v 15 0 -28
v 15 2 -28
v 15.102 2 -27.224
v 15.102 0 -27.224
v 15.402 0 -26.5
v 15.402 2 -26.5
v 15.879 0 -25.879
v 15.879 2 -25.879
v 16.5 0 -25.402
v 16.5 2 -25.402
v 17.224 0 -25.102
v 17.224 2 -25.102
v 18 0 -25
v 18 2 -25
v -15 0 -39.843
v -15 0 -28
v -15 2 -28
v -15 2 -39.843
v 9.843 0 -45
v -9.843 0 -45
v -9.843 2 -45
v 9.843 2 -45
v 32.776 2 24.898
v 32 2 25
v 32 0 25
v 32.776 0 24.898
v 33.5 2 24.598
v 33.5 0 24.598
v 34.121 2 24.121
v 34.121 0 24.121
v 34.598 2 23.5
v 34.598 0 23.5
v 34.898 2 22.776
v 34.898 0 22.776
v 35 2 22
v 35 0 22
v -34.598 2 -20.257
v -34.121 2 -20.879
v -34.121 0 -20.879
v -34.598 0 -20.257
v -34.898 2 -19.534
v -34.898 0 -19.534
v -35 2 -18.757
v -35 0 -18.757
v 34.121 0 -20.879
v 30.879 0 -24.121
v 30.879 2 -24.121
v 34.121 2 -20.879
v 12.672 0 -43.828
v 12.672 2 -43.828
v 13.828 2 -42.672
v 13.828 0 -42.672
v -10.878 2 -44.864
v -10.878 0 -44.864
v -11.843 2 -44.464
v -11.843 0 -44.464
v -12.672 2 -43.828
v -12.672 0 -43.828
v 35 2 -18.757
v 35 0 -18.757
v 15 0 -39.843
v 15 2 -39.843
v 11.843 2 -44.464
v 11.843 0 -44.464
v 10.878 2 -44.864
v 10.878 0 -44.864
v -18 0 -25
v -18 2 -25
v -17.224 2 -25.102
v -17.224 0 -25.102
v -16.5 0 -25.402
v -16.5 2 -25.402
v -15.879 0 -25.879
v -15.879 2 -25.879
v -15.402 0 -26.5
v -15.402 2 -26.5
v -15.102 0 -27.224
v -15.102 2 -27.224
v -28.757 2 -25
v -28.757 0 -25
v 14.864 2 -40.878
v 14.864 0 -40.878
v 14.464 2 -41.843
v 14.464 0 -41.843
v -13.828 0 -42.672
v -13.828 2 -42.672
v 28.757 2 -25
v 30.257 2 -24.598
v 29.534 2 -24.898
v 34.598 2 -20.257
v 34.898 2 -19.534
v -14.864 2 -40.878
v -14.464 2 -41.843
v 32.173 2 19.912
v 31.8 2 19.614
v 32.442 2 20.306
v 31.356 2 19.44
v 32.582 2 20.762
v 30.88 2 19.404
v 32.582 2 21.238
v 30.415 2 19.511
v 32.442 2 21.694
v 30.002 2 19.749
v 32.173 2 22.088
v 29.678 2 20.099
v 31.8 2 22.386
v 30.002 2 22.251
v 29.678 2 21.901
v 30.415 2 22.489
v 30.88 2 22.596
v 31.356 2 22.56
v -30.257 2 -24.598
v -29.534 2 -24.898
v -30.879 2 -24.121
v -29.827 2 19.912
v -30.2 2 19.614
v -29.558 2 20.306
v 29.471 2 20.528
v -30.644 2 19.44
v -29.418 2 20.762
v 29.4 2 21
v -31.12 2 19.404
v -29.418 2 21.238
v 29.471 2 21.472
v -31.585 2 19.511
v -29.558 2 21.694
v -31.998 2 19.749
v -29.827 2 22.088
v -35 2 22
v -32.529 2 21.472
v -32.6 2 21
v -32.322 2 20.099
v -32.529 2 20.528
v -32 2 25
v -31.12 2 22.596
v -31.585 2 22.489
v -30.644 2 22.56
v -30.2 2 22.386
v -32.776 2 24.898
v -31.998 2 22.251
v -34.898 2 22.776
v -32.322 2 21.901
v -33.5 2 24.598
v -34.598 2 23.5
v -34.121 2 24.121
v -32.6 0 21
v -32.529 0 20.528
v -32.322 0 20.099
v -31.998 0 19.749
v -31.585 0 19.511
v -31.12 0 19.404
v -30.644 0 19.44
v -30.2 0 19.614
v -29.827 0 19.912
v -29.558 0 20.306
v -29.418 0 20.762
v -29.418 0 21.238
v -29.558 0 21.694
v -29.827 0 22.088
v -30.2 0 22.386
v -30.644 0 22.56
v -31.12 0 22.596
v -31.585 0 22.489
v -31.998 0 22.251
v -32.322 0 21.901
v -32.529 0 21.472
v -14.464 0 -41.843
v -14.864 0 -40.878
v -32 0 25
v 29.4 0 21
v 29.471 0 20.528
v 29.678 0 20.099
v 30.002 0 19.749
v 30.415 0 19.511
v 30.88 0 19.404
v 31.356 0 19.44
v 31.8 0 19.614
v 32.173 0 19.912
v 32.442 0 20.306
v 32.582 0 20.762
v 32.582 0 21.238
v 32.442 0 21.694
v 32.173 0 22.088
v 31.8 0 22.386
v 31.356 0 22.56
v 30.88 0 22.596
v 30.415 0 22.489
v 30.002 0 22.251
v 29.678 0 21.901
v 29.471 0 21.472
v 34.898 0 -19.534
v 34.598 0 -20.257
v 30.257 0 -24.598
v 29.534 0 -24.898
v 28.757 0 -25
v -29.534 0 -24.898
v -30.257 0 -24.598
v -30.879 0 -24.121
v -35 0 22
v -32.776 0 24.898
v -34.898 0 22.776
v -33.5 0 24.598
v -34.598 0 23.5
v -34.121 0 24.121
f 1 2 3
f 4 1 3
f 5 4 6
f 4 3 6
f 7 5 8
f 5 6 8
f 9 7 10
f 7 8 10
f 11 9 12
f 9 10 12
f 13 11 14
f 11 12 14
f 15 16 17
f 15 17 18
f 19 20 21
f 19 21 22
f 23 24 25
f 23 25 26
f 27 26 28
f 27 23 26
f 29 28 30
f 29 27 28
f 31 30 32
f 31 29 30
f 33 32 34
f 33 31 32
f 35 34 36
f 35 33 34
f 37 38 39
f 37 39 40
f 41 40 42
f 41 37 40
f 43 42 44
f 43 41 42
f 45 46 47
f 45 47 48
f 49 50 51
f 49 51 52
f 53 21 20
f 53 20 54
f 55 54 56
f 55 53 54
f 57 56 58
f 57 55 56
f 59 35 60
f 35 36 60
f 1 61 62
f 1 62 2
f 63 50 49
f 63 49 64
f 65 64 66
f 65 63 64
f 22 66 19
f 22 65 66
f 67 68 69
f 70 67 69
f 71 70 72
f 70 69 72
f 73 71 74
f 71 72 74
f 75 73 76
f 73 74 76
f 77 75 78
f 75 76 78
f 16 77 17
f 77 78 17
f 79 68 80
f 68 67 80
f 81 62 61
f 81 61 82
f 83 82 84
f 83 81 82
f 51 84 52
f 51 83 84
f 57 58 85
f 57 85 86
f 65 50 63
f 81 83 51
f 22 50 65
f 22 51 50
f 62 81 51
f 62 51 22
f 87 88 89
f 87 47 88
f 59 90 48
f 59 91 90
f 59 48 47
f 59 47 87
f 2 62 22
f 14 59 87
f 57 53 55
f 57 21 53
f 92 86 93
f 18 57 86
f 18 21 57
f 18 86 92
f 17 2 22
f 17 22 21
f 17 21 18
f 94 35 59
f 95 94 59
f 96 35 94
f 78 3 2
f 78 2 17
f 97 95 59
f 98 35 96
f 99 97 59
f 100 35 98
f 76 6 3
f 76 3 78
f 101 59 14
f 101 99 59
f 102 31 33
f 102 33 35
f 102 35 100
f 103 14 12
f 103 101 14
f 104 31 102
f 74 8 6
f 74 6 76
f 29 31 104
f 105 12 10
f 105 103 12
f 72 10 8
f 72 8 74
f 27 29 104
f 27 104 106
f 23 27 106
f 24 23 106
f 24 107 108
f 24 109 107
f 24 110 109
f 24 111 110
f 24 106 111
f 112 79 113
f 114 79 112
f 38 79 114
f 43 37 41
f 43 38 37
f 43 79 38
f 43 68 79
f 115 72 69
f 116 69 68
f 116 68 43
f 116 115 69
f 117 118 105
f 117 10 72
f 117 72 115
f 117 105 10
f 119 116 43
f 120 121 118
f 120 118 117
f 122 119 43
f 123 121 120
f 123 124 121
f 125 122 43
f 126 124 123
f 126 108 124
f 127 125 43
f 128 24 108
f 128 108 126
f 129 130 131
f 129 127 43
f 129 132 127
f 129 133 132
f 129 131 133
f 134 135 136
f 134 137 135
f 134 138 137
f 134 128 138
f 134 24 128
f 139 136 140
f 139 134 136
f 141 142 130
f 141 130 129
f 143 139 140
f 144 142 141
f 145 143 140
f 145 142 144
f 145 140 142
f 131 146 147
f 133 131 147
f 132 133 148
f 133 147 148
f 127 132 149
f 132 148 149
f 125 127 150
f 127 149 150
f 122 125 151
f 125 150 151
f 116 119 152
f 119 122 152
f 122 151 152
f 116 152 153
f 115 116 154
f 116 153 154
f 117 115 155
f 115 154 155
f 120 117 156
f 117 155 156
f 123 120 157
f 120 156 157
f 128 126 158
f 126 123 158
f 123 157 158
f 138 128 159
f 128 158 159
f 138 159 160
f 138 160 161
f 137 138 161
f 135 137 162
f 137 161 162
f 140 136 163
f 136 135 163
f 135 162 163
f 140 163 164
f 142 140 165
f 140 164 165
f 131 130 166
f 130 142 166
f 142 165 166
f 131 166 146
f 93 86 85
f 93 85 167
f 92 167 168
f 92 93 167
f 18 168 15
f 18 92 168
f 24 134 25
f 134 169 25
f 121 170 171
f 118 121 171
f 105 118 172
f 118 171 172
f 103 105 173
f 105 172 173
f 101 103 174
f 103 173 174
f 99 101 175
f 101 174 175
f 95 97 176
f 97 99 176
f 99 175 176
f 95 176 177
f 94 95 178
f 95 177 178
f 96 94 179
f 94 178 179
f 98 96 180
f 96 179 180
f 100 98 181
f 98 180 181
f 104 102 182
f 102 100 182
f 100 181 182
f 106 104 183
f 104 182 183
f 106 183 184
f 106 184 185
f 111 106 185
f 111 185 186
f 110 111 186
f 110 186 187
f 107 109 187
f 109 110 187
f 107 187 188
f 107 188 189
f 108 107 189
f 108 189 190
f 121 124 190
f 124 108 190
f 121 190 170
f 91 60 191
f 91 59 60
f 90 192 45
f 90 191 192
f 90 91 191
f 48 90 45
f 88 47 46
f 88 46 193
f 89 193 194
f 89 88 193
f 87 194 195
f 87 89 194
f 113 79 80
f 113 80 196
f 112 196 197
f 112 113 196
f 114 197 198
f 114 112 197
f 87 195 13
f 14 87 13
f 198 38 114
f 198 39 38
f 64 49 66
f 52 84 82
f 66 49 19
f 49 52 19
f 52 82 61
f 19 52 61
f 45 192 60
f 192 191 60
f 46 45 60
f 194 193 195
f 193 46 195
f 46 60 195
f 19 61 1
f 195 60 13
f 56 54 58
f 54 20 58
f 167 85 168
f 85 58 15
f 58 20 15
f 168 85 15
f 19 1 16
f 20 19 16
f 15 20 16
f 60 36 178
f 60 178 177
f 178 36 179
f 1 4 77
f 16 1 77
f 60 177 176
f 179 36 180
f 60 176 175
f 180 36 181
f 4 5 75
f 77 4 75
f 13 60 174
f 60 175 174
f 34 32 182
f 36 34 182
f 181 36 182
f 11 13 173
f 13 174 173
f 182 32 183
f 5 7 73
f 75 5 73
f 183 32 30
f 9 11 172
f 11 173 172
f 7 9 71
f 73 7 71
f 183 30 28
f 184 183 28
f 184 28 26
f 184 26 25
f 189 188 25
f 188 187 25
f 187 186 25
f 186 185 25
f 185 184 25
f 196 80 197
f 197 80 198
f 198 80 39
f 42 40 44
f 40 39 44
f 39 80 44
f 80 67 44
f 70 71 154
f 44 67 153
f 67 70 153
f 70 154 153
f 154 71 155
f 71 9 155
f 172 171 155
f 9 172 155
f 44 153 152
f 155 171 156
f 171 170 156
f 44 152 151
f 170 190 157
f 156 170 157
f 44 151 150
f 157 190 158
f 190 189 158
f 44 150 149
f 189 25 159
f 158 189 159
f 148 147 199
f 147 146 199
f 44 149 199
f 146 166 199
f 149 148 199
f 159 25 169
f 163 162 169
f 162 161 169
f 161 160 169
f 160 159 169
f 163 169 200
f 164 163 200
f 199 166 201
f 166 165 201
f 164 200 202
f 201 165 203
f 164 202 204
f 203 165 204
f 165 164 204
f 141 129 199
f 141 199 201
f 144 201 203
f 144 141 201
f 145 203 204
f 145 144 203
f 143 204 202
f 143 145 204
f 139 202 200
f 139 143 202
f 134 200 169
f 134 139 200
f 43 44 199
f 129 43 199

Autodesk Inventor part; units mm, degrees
ref_plane "YZ Plane" through (0, 0, 0) normal (1, 0, 0) x (0, 1, 0)
ref_plane "XZ Plane" through (0, 0, 0) normal (0, 1, 0) x (-1, 0, 0)
ref_plane "XY Plane" through (0, 0, 0) normal (0, 0, 1) x (1, 0, 0)
sketch "Sketch1" plane through (0, 0, 0) normal (0, 1, 0) x (-1, 0, 0)
  line L0 (35, 25) -> (-35, 25)
  line L1 (-35, 25) -> (-35, -20)
  line L2 (-30, -25) -> (30, -25)
  line L3 (35, -20) -> (35, 25)
  line L4 (35, 25) -> (-35, -25) construction
  line L5 (-35, 25) -> (35, -25) construction
  line L6 (35, 25) -> (31, 25)
  line L7 (31, 25) -> (31, 21) construction
  line L8 (31, 21) -> (35, 21) construction
  line L9 (35, 21) -> (35, 25)
  line L10 (0, 25) -> (0, -25) construction
  circle A0 centre (31, 21) radius 1.6
  circle A1 centre (-31, 21) radius 1.6
  line L11 (15, -45) -> (-15, -45)
  line L12 (-15, -45) -> (-15, -5)
  line L13 (-15, -5) -> (15, -5)
  line L14 (15, -5) -> (15, -45)
  line L15 (15, -45) -> (-15, -5) construction
  line L16 (-15, -45) -> (15, -5) construction
  line L17 (27, 17) -> (35, 17) construction
  line L18 (35, 17) -> (35, 25) construction
  line L19 (35, 25) -> (27, 25) construction
  line L20 (27, 25) -> (27, 17) construction
  line L21 (27, 17) -> (35, 25) construction
  line L22 (35, 17) -> (27, 25) construction
  line L23 (-27, 17) -> (-35, 17) construction
  line L24 (-35, 17) -> (-35, 25) construction
  line L25 (-35, 25) -> (-27, 25) construction
  line L26 (-27, 25) -> (-27, 17) construction
  line L27 (-27, 17) -> (-35, 25) construction
  line L28 (-35, 17) -> (-27, 25) construction
  line L29 (35, -20) -> (30, -25)
  line L30 (-30, -25) -> (-35, -20)
  point P0 (0, 0)
  point P1 (15, -25)
  point P2 (-15, -25)
  dimension "d0" = 70
  dimension "d1" = 50
  dimension "d11" = 4
  dimension "d12" = 4
  dimension "d13" = 3.2
  dimension "d14" = 30
  dimension "d15" = 40
  dimension "d16" = 5
  dimension "d17" = 5
  dimension "d18" = 5
  dimension "d19" = 5
extrude "Extrusion1" add sketch "Sketch1" along normal blind 2
fillet "Fillet1" radius 3 8 edges at (-35, 1, 25) (35, 1, 25) (-15, 1, -25) (15, 1, -25) (30, 1, -25) (35, 1, -20) (-35, 1, -20) (-30, 1, -25)
chamfer "Chamfer1" distance 3.5 angle 45 2 edges at (-15, 1, -45) (15, 1, -45)
fillet "Fillet3" radius 4 4 edges at (15, 1, -41.5) (11.5, 1, -45) (-11.5, 1, -45) (-15, 1, -41.5)
sketch "Sketch2" plane through (0, 2, 0) normal (0, 1, 0) x (1, 0, 0)
  arc A0 (-9.8431, 45) -> (-12.6716, 43.8284) centre (-9.8431, 41) ccw projected
  line L0 (-9.8431, 45) -> (9.8431, 45) projected
  arc A1 (12.6716, 43.8284) -> (9.8431, 45) centre (9.8431, 41) ccw projected
  line L1 (12.6716, 43.8284) -> (13.8284, 42.6716) projected
  arc A2 (15, 39.8431) -> (13.8284, 42.6716) centre (11, 39.8431) ccw projected
  line L2 (15, 39.8431) -> (15, 28) projected
  arc A3 (15, 28) -> (18, 25) centre (18, 28) ccw projected
  line L3 (18, 25) -> (28.7574, 25) projected
  arc A4 (30.8787, 24.1213) -> (28.7574, 25) centre (28.7574, 22) ccw projected
  line L4 (30.8787, 24.1213) -> (34.1213, 20.8787) projected
  arc A5 (35, 18.7574) -> (34.1213, 20.8787) centre (32, 18.7574) ccw projected
  line L5 (35, 18.7574) -> (35, -22) projected
  arc A6 (32, -25) -> (35, -22) centre (32, -22) ccw projected
  line L6 (32, -25) -> (-32, -25) projected
  arc A7 (-35, -22) -> (-32, -25) centre (-32, -22) ccw projected
  line L7 (-35, -22) -> (-35, 18.7574) projected
  arc A8 (-34.1213, 20.8787) -> (-35, 18.7574) centre (-32, 18.7574) ccw projected
  line L8 (-34.1213, 20.8787) -> (-30.8787, 24.1213) projected
  arc A9 (-28.7574, 25) -> (-30.8787, 24.1213) centre (-28.7574, 22) ccw projected
  line L9 (-28.7574, 25) -> (-18, 25) projected
  arc A10 (-18, 25) -> (-15, 28) centre (-18, 28) ccw projected
  line L10 (-15, 28) -> (-15, 39.8431) projected
  arc A11 (-13.8284, 42.6716) -> (-15, 39.8431) centre (-11, 39.8431) ccw projected
  line L11 (-13.8284, 42.6716) -> (-12.6716, 43.8284) projected
  circle A12 centre (31, -21) radius 1.6 projected
  circle A13 centre (-31, -21) radius 1.6 projected
  line L12 (-13.31, 26.23) -> (-13.31, 38.93)
  line L13 (-13.31, 38.93) -> (-8.23, 38.93)
  line L14 (-8.23, 38.93) -> (-8.23, 26.23)
  line L15 (-8.23, 26.23) -> (-13.31, 26.23)
  line L16 (-12.14, 37.96) -> (-12.34, 37.96)
  line L17 (-12.34, 37.96) -> (-12.34, 37.36)
  line L18 (-12.34, 37.36) -> (-12.14, 37.36)
  line L19 (-12.14, 37.36) -> (-12.14, 37.41)
  line L20 (-12.14, 37.41) -> (-11.94, 37.41)
  line L21 (-11.94, 37.41) -> (-11.94, 37.36)
  line L22 (-11.94, 37.36) -> (-11.74, 37.36)
  line L23 (-11.74, 37.36) -> (-11.74, 37.96)
  line L24 (-11.74, 37.96) -> (-11.94, 37.96)
  line L25 (-11.94, 37.96) -> (-11.94, 37.91)
  line L26 (-11.94, 37.91) -> (-12.14, 37.91)
  line L27 (-12.14, 37.91) -> (-12.14, 37.96)
  line L28 (-12.14, 35.42) -> (-12.34, 35.42)
  line L29 (-12.34, 35.42) -> (-12.34, 34.82)
  line L30 (-12.34, 34.82) -> (-12.14, 34.82)
  line L31 (-12.14, 34.82) -> (-12.14, 34.87)
  line L32 (-12.14, 34.87) -> (-11.94, 34.87)
  line L33 (-11.94, 34.87) -> (-11.94, 34.82)
  line L34 (-11.94, 34.82) -> (-11.74, 34.82)
  line L35 (-11.74, 34.82) -> (-11.74, 35.42)
  line L36 (-11.74, 35.42) -> (-11.94, 35.42)
  line L37 (-11.94, 35.42) -> (-11.94, 35.37)
  line L38 (-11.94, 35.37) -> (-12.14, 35.37)
  line L39 (-12.14, 35.37) -> (-12.14, 35.42)
  line L40 (-12.14, 32.88) -> (-12.34, 32.88)
  line L41 (-12.34, 32.88) -> (-12.34, 32.28)
  line L42 (-12.34, 32.28) -> (-12.14, 32.28)
  line L43 (-12.14, 32.28) -> (-12.14, 32.33)
  line L44 (-12.14, 32.33) -> (-11.94, 32.33)
  line L45 (-11.94, 32.33) -> (-11.94, 32.28)
  line L46 (-11.94, 32.28) -> (-11.74, 32.28)
  line L47 (-11.74, 32.28) -> (-11.74, 32.88)
  line L48 (-11.74, 32.88) -> (-11.94, 32.88)
  line L49 (-11.94, 32.88) -> (-11.94, 32.83)
  line L50 (-11.94, 32.83) -> (-12.14, 32.83)
  line L51 (-12.14, 32.83) -> (-12.14, 32.88)
  line L52 (-12.14, 30.34) -> (-12.34, 30.34)
  line L53 (-12.34, 30.34) -> (-12.34, 29.74)
  line L54 (-12.34, 29.74) -> (-12.14, 29.74)
  line L55 (-12.14, 29.74) -> (-12.14, 29.79)
  line L56 (-12.14, 29.79) -> (-11.94, 29.79)
  line L57 (-11.94, 29.79) -> (-11.94, 29.74)
  line L58 (-11.94, 29.74) -> (-11.74, 29.74)
  line L59 (-11.74, 29.74) -> (-11.74, 30.34)
  line L60 (-11.74, 30.34) -> (-11.94, 30.34)
  line L61 (-11.94, 30.34) -> (-11.94, 30.29)
  line L62 (-11.94, 30.29) -> (-12.14, 30.29)
  line L63 (-12.14, 30.29) -> (-12.14, 30.34)
  line L64 (-12.14, 27.8) -> (-12.34, 27.8)
  line L65 (-12.34, 27.8) -> (-12.34, 27.2)
  line L66 (-12.34, 27.2) -> (-12.14, 27.2)
  line L67 (-12.14, 27.2) -> (-12.14, 27.25)
  line L68 (-12.14, 27.25) -> (-11.94, 27.25)
  line L69 (-11.94, 27.25) -> (-11.94, 27.2)
  line L70 (-11.94, 27.2) -> (-11.74, 27.2)
  line L71 (-11.74, 27.2) -> (-11.74, 27.8)
  line L72 (-11.74, 27.8) -> (-11.94, 27.8)
  line L73 (-11.94, 27.8) -> (-11.94, 27.75)
  line L74 (-11.94, 27.75) -> (-12.14, 27.75)
  line L75 (-12.14, 27.75) -> (-12.14, 27.8)
  line L76 (-9.4, 37.36) -> (-9.2, 37.36)
  line L77 (-9.2, 37.36) -> (-9.2, 37.96)
  line L78 (-9.2, 37.96) -> (-9.4, 37.96)
  line L79 (-9.4, 37.96) -> (-9.4, 37.91)
  line L80 (-9.4, 37.91) -> (-9.6, 37.91)
  line L81 (-9.6, 37.91) -> (-9.6, 37.96)
  line L82 (-9.6, 37.96) -> (-9.8, 37.96)
  line L83 (-9.8, 37.96) -> (-9.8, 37.36)
  line L84 (-9.8, 37.36) -> (-9.6, 37.36)
  line L85 (-9.6, 37.36) -> (-9.6, 37.41)
  line L86 (-9.6, 37.41) -> (-9.4, 37.41)
  line L87 (-9.4, 37.41) -> (-9.4, 37.36)
  line L88 (-9.4, 34.82) -> (-9.2, 34.82)
  line L89 (-9.2, 34.82) -> (-9.2, 35.42)
  line L90 (-9.2, 35.42) -> (-9.4, 35.42)
  line L91 (-9.4, 35.42) -> (-9.4, 35.37)
  line L92 (-9.4, 35.37) -> (-9.6, 35.37)
  line L93 (-9.6, 35.37) -> (-9.6, 35.42)
  line L94 (-9.6, 35.42) -> (-9.8, 35.42)
  line L95 (-9.8, 35.42) -> (-9.8, 34.82)
  line L96 (-9.8, 34.82) -> (-9.6, 34.82)
  line L97 (-9.6, 34.82) -> (-9.6, 34.87)
  line L98 (-9.6, 34.87) -> (-9.4, 34.87)
  line L99 (-9.4, 34.87) -> (-9.4, 34.82)
  line L100 (-9.4, 32.28) -> (-9.2, 32.28)
  line L101 (-9.2, 32.28) -> (-9.2, 32.88)
  line L102 (-9.2, 32.88) -> (-9.4, 32.88)
  line L103 (-9.4, 32.88) -> (-9.4, 32.83)
  line L104 (-9.4, 32.83) -> (-9.6, 32.83)
  line L105 (-9.6, 32.83) -> (-9.6, 32.88)
  line L106 (-9.6, 32.88) -> (-9.8, 32.88)
  line L107 (-9.8, 32.88) -> (-9.8, 32.28)
  line L108 (-9.8, 32.28) -> (-9.6, 32.28)
  line L109 (-9.6, 32.28) -> (-9.6, 32.33)
  line L110 (-9.6, 32.33) -> (-9.4, 32.33)
  line L111 (-9.4, 32.33) -> (-9.4, 32.28)
  line L112 (-9.4, 29.74) -> (-9.2, 29.74)
  line L113 (-9.2, 29.74) -> (-9.2, 30.34)
  line L114 (-9.2, 30.34) -> (-9.4, 30.34)
  line L115 (-9.4, 30.34) -> (-9.4, 30.29)
  line L116 (-9.4, 30.29) -> (-9.6, 30.29)
  line L117 (-9.6, 30.29) -> (-9.6, 30.34)
  line L118 (-9.6, 30.34) -> (-9.8, 30.34)
  line L119 (-9.8, 30.34) -> (-9.8, 29.74)
  line L120 (-9.8, 29.74) -> (-9.6, 29.74)
  line L121 (-9.6, 29.74) -> (-9.6, 29.79)
  line L122 (-9.6, 29.79) -> (-9.4, 29.79)
  line L123 (-9.4, 29.79) -> (-9.4, 29.74)
  line L124 (-9.4, 27.2) -> (-9.2, 27.2)
  line L125 (-9.2, 27.2) -> (-9.2, 27.8)
  line L126 (-9.2, 27.8) -> (-9.4, 27.8)
  line L127 (-9.4, 27.8) -> (-9.4, 27.75)
  line L128 (-9.4, 27.75) -> (-9.6, 27.75)
  line L129 (-9.6, 27.75) -> (-9.6, 27.8)
  line L130 (-9.6, 27.8) -> (-9.8, 27.8)
  line L131 (-9.8, 27.8) -> (-9.8, 27.2)
  line L132 (-9.8, 27.2) -> (-9.6, 27.2)
  line L133 (-9.6, 27.2) -> (-9.6, 27.25)
  line L134 (-9.6, 27.25) -> (-9.4, 27.25)
  line L135 (-9.4, 27.25) -> (-9.4, 27.2)
  line L136 (8.23, 26.23) -> (8.23, 38.93)
  line L137 (8.23, 38.93) -> (13.31, 38.93)
  line L138 (13.31, 38.93) -> (13.31, 26.23)
  line L139 (13.31, 26.23) -> (8.23, 26.23)
  line L140 (9.4, 37.96) -> (9.2, 37.96)
  line L141 (9.2, 37.96) -> (9.2, 37.36)
  line L142 (9.2, 37.36) -> (9.4, 37.36)
  line L143 (9.4, 37.36) -> (9.4, 37.41)
  line L144 (9.4, 37.41) -> (9.6, 37.41)
  line L145 (9.6, 37.41) -> (9.6, 37.36)
  line L146 (9.6, 37.36) -> (9.8, 37.36)
  line L147 (9.8, 37.36) -> (9.8, 37.96)
  line L148 (9.8, 37.96) -> (9.6, 37.96)
  line L149 (9.6, 37.96) -> (9.6, 37.91)
  line L150 (9.6, 37.91) -> (9.4, 37.91)
  line L151 (9.4, 37.91) -> (9.4, 37.96)
  line L152 (9.4, 35.42) -> (9.2, 35.42)
  line L153 (9.2, 35.42) -> (9.2, 34.82)
  line L154 (9.2, 34.82) -> (9.4, 34.82)
  line L155 (9.4, 34.82) -> (9.4, 34.87)
  line L156 (9.4, 34.87) -> (9.6, 34.87)
  line L157 (9.6, 34.87) -> (9.6, 34.82)
  line L158 (9.6, 34.82) -> (9.8, 34.82)
  line L159 (9.8, 34.82) -> (9.8, 35.42)
  line L160 (9.8, 35.42) -> (9.6, 35.42)
  line L161 (9.6, 35.42) -> (9.6, 35.37)
  line L162 (9.6, 35.37) -> (9.4, 35.37)
  line L163 (9.4, 35.37) -> (9.4, 35.42)
  line L164 (9.4, 32.88) -> (9.2, 32.88)
  line L165 (9.2, 32.88) -> (9.2, 32.28)
  line L166 (9.2, 32.28) -> (9.4, 32.28)
  line L167 (9.4, 32.28) -> (9.4, 32.33)
  line L168 (9.4, 32.33) -> (9.6, 32.33)
  line L169 (9.6, 32.33) -> (9.6, 32.28)
  line L170 (9.6, 32.28) -> (9.8, 32.28)
  line L171 (9.8, 32.28) -> (9.8, 32.88)
  line L172 (9.8, 32.88) -> (9.6, 32.88)
  line L173 (9.6, 32.88) -> (9.6, 32.83)
  line L174 (9.6, 32.83) -> (9.4, 32.83)
  line L175 (9.4, 32.83) -> (9.4, 32.88)
  line L176 (9.4, 30.34) -> (9.2, 30.34)
  line L177 (9.2, 30.34) -> (9.2, 29.74)
  line L178 (9.2, 29.74) -> (9.4, 29.74)
  line L179 (9.4, 29.74) -> (9.4, 29.79)
  line L180 (9.4, 29.79) -> (9.6, 29.79)
  line L181 (9.6, 29.79) -> (9.6, 29.74)
  line L182 (9.6, 29.74) -> (9.8, 29.74)
  line L183 (9.8, 29.74) -> (9.8, 30.34)
  line L184 (9.8, 30.34) -> (9.6, 30.34)
  line L185 (9.6, 30.34) -> (9.6, 30.29)
  line L186 (9.6, 30.29) -> (9.4, 30.29)
  line L187 (9.4, 30.29) -> (9.4, 30.34)
  line L188 (9.4, 27.8) -> (9.2, 27.8)
  line L189 (9.2, 27.8) -> (9.2, 27.2)
  line L190 (9.2, 27.2) -> (9.4, 27.2)
  line L191 (9.4, 27.2) -> (9.4, 27.25)
  line L192 (9.4, 27.25) -> (9.6, 27.25)
  line L193 (9.6, 27.25) -> (9.6, 27.2)
  line L194 (9.6, 27.2) -> (9.8, 27.2)
  line L195 (9.8, 27.2) -> (9.8, 27.8)
  line L196 (9.8, 27.8) -> (9.6, 27.8)
  line L197 (9.6, 27.8) -> (9.6, 27.75)
  line L198 (9.6, 27.75) -> (9.4, 27.75)
  line L199 (9.4, 27.75) -> (9.4, 27.8)
  line L200 (12.14, 37.36) -> (12.34, 37.36)
  line L201 (12.34, 37.36) -> (12.34, 37.96)
  line L202 (12.34, 37.96) -> (12.14, 37.96)
  line L203 (12.14, 37.96) -> (12.14, 37.91)
  line L204 (12.14, 37.91) -> (11.94, 37.91)
  line L205 (11.94, 37.91) -> (11.94, 37.96)
  line L206 (11.94, 37.96) -> (11.74, 37.96)
  line L207 (11.74, 37.96) -> (11.74, 37.36)
  line L208 (11.74, 37.36) -> (11.94, 37.36)
  line L209 (11.94, 37.36) -> (11.94, 37.41)
  line L210 (11.94, 37.41) -> (12.14, 37.41)
  line L211 (12.14, 37.41) -> (12.14, 37.36)
  line L212 (12.14, 34.82) -> (12.34, 34.82)
  line L213 (12.34, 34.82) -> (12.34, 35.42)
  line L214 (12.34, 35.42) -> (12.14, 35.42)
  line L215 (12.14, 35.42) -> (12.14, 35.37)
  line L216 (12.14, 35.37) -> (11.94, 35.37)
  line L217 (11.94, 35.37) -> (11.94, 35.42)
  line L218 (11.94, 35.42) -> (11.74, 35.42)
  line L219 (11.74, 35.42) -> (11.74, 34.82)
  line L220 (11.74, 34.82) -> (11.94, 34.82)
  line L221 (11.94, 34.82) -> (11.94, 34.87)
  line L222 (11.94, 34.87) -> (12.14, 34.87)
  line L223 (12.14, 34.87) -> (12.14, 34.82)
  line L224 (12.14, 32.28) -> (12.34, 32.28)
  line L225 (12.34, 32.28) -> (12.34, 32.88)
  line L226 (12.34, 32.88) -> (12.14, 32.88)
  line L227 (12.14, 32.88) -> (12.14, 32.83)
  line L228 (12.14, 32.83) -> (11.94, 32.83)
  line L229 (11.94, 32.83) -> (11.94, 32.88)
  line L230 (11.94, 32.88) -> (11.74, 32.88)
  line L231 (11.74, 32.88) -> (11.74, 32.28)
  line L232 (11.74, 32.28) -> (11.94, 32.28)
  line L233 (11.94, 32.28) -> (11.94, 32.33)
  line L234 (11.94, 32.33) -> (12.14, 32.33)
  line L235 (12.14, 32.33) -> (12.14, 32.28)
  line L236 (12.14, 29.74) -> (12.34, 29.74)
  line L237 (12.34, 29.74) -> (12.34, 30.34)
  line L238 (12.34, 30.34) -> (12.14, 30.34)
  line L239 (12.14, 30.34) -> (12.14, 30.29)
  line L240 (12.14, 30.29) -> (11.94, 30.29)
  line L241 (11.94, 30.29) -> (11.94, 30.34)
  line L242 (11.94, 30.34) -> (11.74, 30.34)
  line L243 (11.74, 30.34) -> (11.74, 29.74)
  line L244 (11.74, 29.74) -> (11.94, 29.74)
  line L245 (11.94, 29.74) -> (11.94, 29.79)
  line L246 (11.94, 29.79) -> (12.14, 29.79)
  line L247 (12.14, 29.79) -> (12.14, 29.74)
  line L248 (12.14, 27.2) -> (12.34, 27.2)
  line L249 (12.34, 27.2) -> (12.34, 27.8)
  line L250 (12.34, 27.8) -> (12.14, 27.8)
  line L251 (12.14, 27.8) -> (12.14, 27.75)
  line L252 (12.14, 27.75) -> (11.94, 27.75)
  line L253 (11.94, 27.75) -> (11.94, 27.8)
  line L254 (11.94, 27.8) -> (11.74, 27.8)
  line L255 (11.74, 27.8) -> (11.74, 27.2)
  line L256 (11.74, 27.2) -> (11.94, 27.2)
  line L257 (11.94, 27.2) -> (11.94, 27.25)
  line L258 (11.94, 27.25) -> (12.14, 27.25)
  line L259 (12.14, 27.25) -> (12.14, 27.2)
  point P0 (0, 0)
sketch "Sketch3" plane through (0, 2, 0) normal (0, 1, 0) x (1, 0, 0)
  point P0 (0, 0)
equation "\"d17\" = d16"
equation "\"d18\" = d16"
equation "\"d19\" = d18"
properties part number "Motor Driver Board"
